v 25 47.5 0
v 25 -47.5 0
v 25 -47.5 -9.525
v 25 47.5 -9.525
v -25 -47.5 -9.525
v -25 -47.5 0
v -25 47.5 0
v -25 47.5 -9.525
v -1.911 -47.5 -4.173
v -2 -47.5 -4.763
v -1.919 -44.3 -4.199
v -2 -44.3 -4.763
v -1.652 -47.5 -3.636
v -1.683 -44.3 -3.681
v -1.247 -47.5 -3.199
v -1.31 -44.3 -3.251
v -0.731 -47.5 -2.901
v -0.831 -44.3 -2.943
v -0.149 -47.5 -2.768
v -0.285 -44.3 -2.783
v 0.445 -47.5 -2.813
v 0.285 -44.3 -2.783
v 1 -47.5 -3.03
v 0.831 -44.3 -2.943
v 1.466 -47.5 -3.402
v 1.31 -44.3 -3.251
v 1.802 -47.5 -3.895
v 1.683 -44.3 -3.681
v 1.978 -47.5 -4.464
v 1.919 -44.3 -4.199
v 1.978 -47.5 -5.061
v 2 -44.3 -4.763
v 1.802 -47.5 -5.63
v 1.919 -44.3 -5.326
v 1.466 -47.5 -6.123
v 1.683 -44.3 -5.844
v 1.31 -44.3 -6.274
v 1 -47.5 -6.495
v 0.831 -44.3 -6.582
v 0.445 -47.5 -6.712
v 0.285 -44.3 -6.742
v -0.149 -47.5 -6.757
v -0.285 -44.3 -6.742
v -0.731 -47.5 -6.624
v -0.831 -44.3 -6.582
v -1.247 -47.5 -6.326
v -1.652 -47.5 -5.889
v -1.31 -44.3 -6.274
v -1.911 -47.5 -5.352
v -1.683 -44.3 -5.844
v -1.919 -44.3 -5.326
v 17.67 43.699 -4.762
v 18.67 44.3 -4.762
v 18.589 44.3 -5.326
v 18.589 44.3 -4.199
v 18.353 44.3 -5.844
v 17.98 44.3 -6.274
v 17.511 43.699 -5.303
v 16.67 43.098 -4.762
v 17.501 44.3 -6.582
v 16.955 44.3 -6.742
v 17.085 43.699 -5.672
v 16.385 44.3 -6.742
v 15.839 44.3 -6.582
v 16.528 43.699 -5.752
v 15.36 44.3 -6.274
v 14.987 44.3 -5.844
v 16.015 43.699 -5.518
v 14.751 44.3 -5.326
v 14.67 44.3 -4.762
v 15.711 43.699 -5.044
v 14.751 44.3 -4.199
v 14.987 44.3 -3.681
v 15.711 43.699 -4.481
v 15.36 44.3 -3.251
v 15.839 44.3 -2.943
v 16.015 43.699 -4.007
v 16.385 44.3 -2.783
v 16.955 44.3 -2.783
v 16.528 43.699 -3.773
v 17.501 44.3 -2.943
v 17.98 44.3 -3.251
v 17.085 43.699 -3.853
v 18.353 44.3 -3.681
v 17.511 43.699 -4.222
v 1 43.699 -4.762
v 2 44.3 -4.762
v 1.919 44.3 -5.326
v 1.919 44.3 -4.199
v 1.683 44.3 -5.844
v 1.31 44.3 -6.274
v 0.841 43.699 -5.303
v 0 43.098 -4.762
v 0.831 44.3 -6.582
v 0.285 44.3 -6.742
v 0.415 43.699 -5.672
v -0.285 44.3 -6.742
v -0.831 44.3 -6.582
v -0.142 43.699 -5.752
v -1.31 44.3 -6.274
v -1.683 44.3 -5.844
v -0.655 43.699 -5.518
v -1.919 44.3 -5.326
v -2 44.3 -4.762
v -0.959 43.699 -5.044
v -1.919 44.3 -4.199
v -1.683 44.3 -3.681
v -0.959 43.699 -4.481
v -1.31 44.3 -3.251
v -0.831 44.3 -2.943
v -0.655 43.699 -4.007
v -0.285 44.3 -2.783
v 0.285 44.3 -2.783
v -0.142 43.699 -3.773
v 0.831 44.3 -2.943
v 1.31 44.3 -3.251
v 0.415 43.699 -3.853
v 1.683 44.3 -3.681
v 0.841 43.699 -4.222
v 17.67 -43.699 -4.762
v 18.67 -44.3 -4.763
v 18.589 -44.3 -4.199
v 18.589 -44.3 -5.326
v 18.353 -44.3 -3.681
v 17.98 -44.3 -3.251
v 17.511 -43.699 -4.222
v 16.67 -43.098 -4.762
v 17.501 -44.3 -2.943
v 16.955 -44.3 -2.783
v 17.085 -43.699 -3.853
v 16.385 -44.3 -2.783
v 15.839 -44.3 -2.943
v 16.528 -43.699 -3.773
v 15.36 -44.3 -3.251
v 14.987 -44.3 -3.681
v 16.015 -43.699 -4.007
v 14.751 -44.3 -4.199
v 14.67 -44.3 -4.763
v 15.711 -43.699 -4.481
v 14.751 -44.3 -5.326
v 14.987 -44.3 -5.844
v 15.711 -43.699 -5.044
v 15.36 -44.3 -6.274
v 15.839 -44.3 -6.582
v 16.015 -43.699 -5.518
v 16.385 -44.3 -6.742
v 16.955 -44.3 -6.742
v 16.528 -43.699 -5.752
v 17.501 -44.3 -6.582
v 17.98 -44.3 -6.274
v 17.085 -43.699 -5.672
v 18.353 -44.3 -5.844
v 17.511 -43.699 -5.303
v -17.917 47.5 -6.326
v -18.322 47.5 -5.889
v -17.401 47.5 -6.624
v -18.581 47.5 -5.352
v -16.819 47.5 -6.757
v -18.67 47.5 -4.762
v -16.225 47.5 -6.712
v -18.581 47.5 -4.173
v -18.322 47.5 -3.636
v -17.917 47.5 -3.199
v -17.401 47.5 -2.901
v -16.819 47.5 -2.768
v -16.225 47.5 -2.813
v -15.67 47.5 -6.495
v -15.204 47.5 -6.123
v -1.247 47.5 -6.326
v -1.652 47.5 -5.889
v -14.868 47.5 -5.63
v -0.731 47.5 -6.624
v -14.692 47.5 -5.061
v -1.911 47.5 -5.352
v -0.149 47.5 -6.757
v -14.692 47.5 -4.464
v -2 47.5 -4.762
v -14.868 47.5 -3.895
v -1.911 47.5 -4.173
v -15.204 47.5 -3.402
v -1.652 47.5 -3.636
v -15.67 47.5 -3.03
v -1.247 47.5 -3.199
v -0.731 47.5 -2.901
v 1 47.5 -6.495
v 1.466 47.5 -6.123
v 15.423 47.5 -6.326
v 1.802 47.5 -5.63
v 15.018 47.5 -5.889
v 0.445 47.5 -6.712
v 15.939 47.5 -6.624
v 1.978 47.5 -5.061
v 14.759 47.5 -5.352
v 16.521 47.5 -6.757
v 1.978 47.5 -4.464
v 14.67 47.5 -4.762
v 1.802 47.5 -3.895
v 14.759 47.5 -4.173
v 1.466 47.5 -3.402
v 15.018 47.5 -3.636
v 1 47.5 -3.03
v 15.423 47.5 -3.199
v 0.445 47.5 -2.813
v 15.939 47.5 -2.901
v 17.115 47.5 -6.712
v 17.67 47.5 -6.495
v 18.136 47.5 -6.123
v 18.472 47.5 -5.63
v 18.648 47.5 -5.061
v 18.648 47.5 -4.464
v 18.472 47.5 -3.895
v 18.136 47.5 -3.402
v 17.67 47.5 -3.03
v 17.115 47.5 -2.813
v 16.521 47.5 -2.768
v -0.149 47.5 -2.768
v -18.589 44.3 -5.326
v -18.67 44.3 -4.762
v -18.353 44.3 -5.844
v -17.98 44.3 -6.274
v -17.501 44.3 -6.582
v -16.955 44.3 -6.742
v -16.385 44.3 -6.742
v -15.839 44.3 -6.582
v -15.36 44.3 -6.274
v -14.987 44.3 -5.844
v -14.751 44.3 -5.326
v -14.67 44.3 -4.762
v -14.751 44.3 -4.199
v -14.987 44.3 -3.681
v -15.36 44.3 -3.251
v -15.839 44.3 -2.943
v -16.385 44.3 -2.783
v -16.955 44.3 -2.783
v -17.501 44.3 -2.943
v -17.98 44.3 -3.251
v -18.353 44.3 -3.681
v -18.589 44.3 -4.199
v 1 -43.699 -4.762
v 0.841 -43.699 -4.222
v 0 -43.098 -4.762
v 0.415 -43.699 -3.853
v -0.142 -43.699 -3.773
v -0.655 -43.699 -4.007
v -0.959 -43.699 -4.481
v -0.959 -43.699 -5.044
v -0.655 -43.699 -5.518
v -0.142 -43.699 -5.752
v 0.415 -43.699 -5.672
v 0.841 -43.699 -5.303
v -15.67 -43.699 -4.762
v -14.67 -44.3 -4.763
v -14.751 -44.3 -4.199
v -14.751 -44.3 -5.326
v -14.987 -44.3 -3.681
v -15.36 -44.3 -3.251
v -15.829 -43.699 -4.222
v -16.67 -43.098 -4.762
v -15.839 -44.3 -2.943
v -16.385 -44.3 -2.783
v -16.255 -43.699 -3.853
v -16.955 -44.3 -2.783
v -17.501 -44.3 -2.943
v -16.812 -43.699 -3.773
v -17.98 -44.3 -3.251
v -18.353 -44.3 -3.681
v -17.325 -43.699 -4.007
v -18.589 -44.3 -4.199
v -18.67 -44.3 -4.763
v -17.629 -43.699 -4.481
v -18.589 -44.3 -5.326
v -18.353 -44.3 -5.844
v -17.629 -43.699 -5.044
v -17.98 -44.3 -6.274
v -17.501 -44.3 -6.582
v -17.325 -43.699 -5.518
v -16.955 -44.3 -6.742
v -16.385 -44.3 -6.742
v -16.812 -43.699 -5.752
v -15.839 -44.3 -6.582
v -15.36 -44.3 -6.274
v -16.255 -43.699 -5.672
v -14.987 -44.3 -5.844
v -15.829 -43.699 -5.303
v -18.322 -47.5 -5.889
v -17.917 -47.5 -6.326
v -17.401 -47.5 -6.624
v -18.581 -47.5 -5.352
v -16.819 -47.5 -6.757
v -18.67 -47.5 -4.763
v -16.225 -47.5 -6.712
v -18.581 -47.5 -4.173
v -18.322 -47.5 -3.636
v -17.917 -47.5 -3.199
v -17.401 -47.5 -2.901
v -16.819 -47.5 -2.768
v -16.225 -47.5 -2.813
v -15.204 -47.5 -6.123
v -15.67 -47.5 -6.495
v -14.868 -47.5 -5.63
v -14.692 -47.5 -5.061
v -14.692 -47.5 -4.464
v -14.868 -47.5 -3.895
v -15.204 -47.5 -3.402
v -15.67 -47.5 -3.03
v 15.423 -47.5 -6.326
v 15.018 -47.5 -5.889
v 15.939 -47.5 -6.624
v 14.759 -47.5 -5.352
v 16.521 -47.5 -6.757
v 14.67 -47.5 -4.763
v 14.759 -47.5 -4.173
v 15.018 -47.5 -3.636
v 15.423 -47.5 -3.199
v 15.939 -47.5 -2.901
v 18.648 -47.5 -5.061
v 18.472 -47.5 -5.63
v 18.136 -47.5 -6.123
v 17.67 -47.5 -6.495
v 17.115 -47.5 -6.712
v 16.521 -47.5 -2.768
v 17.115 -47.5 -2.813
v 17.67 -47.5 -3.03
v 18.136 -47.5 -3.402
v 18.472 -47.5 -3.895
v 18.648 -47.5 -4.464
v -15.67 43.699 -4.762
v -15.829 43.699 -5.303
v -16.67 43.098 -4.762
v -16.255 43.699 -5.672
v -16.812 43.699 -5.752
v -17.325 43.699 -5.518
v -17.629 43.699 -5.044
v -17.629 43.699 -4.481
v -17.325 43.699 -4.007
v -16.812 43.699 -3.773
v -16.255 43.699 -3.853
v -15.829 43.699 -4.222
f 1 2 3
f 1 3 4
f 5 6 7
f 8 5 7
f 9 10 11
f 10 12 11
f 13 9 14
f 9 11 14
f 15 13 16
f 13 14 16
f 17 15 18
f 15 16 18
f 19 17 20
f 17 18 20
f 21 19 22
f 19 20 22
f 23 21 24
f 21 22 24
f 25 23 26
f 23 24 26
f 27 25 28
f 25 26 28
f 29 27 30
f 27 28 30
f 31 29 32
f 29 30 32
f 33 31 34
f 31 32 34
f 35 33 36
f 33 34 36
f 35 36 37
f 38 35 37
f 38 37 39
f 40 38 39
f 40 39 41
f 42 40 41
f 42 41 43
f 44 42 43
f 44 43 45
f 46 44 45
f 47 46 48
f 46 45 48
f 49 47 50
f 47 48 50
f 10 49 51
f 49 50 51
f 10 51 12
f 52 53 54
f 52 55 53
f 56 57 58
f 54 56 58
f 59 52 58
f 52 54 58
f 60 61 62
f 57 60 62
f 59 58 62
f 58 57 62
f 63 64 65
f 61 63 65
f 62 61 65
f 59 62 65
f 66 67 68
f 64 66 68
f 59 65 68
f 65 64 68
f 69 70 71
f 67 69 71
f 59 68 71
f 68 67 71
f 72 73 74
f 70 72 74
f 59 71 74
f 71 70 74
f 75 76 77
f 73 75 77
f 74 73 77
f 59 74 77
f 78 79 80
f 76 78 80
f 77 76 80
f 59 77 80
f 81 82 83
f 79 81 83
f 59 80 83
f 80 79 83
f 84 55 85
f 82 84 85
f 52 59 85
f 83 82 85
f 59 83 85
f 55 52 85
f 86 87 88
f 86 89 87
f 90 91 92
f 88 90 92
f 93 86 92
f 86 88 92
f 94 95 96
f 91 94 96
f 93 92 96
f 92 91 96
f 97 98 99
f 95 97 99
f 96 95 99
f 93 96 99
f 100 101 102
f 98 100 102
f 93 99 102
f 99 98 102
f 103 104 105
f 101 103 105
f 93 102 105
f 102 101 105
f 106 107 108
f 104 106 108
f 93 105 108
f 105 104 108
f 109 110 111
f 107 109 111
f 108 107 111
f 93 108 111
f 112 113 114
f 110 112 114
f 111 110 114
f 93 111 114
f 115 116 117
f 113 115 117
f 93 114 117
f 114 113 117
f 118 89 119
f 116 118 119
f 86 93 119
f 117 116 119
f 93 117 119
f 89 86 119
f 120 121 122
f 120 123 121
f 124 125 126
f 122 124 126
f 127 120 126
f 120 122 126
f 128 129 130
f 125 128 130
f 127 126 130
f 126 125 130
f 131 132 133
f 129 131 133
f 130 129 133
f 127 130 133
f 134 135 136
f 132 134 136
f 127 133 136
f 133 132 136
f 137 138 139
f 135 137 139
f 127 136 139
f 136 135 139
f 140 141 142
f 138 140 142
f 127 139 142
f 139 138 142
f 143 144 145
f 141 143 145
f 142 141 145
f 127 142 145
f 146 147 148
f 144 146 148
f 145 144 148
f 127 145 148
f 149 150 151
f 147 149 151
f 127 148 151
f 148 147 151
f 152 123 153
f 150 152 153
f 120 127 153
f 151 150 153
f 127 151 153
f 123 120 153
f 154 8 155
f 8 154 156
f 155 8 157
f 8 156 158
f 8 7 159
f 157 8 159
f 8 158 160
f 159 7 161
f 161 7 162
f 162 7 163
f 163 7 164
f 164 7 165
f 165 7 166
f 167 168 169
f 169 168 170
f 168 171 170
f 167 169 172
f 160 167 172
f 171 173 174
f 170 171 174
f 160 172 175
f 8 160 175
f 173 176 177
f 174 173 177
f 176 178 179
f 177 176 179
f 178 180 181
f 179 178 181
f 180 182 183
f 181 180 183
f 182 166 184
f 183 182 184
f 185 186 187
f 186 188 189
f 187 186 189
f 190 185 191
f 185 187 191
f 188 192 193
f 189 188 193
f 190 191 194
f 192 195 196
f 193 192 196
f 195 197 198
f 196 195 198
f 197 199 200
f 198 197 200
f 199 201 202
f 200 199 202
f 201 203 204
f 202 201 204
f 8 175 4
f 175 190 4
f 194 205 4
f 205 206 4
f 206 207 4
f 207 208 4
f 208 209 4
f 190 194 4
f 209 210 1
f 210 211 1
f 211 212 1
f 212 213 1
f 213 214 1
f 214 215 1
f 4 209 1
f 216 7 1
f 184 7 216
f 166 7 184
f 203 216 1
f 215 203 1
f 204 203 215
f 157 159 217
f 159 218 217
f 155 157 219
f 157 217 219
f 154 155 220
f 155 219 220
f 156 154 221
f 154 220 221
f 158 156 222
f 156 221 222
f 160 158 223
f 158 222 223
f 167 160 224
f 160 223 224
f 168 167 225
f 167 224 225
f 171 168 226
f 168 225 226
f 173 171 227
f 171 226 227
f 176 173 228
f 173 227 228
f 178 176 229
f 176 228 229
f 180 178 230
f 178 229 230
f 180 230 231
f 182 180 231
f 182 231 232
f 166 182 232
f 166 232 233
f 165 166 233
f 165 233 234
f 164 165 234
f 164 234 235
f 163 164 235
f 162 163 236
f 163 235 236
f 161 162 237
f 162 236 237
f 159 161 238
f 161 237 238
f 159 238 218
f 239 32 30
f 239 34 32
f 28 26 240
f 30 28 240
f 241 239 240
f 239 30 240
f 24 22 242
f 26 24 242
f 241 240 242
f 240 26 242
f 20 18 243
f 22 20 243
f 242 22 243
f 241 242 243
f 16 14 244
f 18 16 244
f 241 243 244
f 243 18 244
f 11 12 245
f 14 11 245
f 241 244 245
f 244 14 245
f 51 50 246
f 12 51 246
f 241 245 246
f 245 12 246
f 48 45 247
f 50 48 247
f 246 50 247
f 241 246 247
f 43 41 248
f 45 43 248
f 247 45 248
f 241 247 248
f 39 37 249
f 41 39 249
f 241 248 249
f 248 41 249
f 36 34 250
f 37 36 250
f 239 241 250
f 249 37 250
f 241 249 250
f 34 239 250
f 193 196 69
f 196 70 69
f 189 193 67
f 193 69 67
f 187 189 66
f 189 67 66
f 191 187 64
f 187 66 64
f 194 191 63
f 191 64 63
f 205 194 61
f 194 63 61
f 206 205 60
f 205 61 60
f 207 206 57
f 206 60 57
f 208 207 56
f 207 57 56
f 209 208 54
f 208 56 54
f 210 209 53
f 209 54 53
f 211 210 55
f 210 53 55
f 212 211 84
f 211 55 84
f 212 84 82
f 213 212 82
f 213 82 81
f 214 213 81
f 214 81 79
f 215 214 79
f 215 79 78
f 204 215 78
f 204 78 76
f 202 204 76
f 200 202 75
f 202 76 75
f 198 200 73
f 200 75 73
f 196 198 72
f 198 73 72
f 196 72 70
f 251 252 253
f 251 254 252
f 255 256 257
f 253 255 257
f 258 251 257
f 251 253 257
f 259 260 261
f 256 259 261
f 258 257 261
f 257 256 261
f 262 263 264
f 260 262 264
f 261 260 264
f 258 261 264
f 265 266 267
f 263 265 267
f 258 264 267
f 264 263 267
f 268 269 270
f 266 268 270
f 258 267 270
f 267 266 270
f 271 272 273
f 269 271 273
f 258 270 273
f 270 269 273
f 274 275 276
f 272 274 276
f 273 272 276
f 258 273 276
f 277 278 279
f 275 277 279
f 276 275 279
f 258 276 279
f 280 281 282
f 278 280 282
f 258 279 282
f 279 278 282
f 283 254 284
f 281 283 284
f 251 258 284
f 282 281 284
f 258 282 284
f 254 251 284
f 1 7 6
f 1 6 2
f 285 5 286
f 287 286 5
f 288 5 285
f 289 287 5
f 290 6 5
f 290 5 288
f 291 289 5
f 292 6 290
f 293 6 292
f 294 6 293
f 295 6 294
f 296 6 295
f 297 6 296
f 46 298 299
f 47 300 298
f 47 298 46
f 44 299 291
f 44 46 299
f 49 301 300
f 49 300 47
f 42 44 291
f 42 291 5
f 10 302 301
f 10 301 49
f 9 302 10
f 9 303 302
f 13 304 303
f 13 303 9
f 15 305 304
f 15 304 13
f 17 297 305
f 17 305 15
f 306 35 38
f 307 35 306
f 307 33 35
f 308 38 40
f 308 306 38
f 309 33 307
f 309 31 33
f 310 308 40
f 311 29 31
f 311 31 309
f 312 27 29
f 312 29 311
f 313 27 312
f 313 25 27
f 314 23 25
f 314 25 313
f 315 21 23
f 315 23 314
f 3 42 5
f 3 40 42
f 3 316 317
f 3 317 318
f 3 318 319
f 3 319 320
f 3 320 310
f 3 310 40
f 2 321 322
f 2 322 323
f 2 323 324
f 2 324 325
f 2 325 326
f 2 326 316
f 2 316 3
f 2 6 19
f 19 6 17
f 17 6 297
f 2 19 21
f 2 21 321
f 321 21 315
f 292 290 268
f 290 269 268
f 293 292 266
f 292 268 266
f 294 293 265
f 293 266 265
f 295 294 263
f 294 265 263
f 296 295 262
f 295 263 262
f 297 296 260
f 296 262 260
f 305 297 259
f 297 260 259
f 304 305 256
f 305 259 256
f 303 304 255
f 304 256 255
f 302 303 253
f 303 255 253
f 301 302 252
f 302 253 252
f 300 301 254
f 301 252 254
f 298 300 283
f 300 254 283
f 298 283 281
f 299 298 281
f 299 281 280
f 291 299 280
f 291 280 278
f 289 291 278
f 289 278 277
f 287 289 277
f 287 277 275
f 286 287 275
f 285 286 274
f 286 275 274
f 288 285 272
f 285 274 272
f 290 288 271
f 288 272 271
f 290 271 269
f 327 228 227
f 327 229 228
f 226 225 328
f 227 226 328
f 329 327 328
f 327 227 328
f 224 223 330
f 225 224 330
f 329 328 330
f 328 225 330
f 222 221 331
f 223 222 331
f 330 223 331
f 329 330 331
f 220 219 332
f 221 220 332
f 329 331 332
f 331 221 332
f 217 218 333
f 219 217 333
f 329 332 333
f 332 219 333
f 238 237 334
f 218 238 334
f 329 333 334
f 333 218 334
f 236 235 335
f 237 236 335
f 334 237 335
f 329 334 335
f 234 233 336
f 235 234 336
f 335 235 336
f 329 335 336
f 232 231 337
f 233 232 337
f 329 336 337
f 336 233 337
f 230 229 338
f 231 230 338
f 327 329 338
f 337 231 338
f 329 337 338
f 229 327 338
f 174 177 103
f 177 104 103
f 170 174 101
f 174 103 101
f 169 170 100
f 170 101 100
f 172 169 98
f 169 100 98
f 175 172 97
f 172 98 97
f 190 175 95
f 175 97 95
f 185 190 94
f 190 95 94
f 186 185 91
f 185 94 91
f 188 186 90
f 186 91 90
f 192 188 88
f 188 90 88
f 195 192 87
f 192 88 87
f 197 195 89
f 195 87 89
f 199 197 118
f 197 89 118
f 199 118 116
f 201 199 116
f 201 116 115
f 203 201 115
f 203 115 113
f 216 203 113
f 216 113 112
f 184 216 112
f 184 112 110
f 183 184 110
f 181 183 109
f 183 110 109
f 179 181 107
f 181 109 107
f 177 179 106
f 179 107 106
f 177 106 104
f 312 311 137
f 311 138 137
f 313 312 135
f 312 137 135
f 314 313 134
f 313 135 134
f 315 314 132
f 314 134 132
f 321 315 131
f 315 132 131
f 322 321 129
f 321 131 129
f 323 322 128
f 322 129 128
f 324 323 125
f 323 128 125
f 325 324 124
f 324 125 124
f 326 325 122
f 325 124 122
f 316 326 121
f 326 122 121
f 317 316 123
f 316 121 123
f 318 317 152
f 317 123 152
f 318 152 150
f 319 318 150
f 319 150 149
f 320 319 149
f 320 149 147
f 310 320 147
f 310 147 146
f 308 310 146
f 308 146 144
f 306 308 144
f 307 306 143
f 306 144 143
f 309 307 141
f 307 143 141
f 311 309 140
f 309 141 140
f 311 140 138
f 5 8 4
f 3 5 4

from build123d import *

# Parameters (mm, degrees)
SKETCH1_W                 = 50
SKETCH1_H                 = 95
BOSS_EXTRUDE1_DEPTH       = 9.525
F_4_0MM_DOWEL_HOLE1_D     = 4
F_4_0MM_DOWEL_HOLE1_DEPTH = 3.2
F_4_0MM_DOWEL_HOLE1_TIP   = 1.201721238
F_4_0MM_DOWEL_HOLE2_D     = 4
F_4_0MM_DOWEL_HOLE2_DEPTH = 3.2
F_4_0MM_DOWEL_HOLE2_TIP   = 1.201721238


with BuildPart() as part:
    # Sketch1 → Boss-Extrude1 (new body)
    with BuildSketch(Plane.XY):
        Rectangle(SKETCH1_W, SKETCH1_H)
    extrude(amount=-BOSS_EXTRUDE1_DEPTH)

    # Ø4.0mm Dowel Hole1
    with Locations(Plane(origin=(0, 47.5, 0), x_dir=(1, 0, 0), z_dir=(0, 1, 0))):
        with Locations((0, 4.7625), (16.67, 4.7625), (-16.67, 4.7625)):
            Hole(F_4_0MM_DOWEL_HOLE1_D / 2, depth=F_4_0MM_DOWEL_HOLE1_DEPTH)
            with Locations((0, 0, -(F_4_0MM_DOWEL_HOLE1_DEPTH + F_4_0MM_DOWEL_HOLE1_TIP / 2))):  # 118° drill point
                Cone(0, F_4_0MM_DOWEL_HOLE1_D / 2, F_4_0MM_DOWEL_HOLE1_TIP, mode=Mode.SUBTRACT)

    # Ø4.0mm Dowel Hole2
    with Locations(Plane.XZ.offset(47.5)):
        with Locations((16.67, -4.7625), (0, -4.7625), (-16.67, -4.7625)):
            Hole(F_4_0MM_DOWEL_HOLE2_D / 2, depth=F_4_0MM_DOWEL_HOLE2_DEPTH)
            with Locations((0, 0, -(F_4_0MM_DOWEL_HOLE2_DEPTH + F_4_0MM_DOWEL_HOLE2_TIP / 2))):  # 118° drill point
                Cone(0, F_4_0MM_DOWEL_HOLE2_D / 2, F_4_0MM_DOWEL_HOLE2_TIP, mode=Mode.SUBTRACT)


solid = part.part
